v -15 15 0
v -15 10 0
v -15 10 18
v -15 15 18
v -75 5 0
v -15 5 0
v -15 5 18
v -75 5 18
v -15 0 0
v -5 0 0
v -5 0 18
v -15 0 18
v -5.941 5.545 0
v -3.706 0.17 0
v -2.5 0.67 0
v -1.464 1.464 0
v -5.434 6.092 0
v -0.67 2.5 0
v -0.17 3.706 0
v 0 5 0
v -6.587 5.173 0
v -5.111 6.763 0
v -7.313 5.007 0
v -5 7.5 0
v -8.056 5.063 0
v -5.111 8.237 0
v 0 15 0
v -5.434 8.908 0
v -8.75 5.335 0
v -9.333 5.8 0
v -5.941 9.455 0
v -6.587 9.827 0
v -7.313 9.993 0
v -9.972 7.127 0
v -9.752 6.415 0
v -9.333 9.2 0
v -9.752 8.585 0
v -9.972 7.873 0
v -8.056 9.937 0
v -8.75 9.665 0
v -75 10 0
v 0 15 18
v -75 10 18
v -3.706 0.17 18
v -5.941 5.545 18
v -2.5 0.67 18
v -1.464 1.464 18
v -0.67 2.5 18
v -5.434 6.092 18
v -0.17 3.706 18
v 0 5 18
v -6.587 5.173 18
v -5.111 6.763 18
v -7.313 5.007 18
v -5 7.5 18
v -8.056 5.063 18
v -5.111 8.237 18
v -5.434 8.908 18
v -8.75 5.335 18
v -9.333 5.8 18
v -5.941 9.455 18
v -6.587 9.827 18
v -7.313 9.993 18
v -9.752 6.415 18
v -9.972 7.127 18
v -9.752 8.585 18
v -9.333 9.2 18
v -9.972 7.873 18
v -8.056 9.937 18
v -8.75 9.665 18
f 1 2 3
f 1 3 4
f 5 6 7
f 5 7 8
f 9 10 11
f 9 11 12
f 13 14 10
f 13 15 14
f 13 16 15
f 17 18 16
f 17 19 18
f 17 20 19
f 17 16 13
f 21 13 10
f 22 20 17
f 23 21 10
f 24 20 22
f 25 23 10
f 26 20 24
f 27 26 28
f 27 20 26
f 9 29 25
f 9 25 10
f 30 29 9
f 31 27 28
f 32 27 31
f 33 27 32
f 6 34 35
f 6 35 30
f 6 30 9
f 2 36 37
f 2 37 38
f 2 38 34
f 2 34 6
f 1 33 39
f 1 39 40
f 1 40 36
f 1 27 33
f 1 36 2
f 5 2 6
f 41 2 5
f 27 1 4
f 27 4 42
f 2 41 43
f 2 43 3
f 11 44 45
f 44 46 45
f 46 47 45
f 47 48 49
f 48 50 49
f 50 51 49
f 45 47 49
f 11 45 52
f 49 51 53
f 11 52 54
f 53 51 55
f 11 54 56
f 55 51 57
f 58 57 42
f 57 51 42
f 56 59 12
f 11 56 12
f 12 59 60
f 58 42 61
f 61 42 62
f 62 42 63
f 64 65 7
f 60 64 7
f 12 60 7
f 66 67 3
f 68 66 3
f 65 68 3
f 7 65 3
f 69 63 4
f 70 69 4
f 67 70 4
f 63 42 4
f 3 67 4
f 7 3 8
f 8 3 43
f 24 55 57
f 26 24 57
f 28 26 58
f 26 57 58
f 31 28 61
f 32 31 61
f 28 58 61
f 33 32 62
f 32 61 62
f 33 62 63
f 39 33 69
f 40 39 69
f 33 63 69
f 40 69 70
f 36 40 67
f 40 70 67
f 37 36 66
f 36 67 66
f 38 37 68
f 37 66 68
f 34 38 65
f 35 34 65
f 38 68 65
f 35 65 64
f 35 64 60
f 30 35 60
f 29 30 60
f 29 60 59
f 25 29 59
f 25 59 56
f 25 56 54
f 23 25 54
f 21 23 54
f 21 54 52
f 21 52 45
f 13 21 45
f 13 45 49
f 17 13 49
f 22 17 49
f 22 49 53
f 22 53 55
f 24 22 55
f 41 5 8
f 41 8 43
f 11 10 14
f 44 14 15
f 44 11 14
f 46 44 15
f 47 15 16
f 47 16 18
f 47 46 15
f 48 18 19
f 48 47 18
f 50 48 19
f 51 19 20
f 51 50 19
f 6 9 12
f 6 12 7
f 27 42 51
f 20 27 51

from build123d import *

# Parameters (mm, degrees)
AUFSATZ_LINEAR_AUSTRAGEN1_DEPTH = 18
SKIZZE2_R                       = 2.5
SCHNITT_LINEAR_AUSTRAGEN1_DEPTH = 19
VERRUNDUNG1_R                   = 5


with BuildPart() as part:
    # Skizze1 → Aufsatz-Linear austragen1 (new body)
    with BuildSketch(Plane.XY):
        Polygon((0, 0), (-15, 0), (-15, 5), (-75, 5), (-75, 10), (-15, 10), (-15, 15), (0, 15), align=None)
    extrude(amount=AUFSATZ_LINEAR_AUSTRAGEN1_DEPTH)

    # Skizze2 → Schnitt-Linear austragen1 (cut, through all)
    with BuildSketch(Plane.XY.offset(18)):
        with Locations((-7.5, 7.5)):
            Circle(SKIZZE2_R)
    extrude(amount=-SCHNITT_LINEAR_AUSTRAGEN1_DEPTH, mode=Mode.SUBTRACT)

    # Verrundung1
    verrundung1_edges = [part.edges().sort_by_distance(p)[0] for p in [
        (0, 0, 9),
    ]]
    fillet(verrundung1_edges, radius=VERRUNDUNG1_R)


solid = part.part
